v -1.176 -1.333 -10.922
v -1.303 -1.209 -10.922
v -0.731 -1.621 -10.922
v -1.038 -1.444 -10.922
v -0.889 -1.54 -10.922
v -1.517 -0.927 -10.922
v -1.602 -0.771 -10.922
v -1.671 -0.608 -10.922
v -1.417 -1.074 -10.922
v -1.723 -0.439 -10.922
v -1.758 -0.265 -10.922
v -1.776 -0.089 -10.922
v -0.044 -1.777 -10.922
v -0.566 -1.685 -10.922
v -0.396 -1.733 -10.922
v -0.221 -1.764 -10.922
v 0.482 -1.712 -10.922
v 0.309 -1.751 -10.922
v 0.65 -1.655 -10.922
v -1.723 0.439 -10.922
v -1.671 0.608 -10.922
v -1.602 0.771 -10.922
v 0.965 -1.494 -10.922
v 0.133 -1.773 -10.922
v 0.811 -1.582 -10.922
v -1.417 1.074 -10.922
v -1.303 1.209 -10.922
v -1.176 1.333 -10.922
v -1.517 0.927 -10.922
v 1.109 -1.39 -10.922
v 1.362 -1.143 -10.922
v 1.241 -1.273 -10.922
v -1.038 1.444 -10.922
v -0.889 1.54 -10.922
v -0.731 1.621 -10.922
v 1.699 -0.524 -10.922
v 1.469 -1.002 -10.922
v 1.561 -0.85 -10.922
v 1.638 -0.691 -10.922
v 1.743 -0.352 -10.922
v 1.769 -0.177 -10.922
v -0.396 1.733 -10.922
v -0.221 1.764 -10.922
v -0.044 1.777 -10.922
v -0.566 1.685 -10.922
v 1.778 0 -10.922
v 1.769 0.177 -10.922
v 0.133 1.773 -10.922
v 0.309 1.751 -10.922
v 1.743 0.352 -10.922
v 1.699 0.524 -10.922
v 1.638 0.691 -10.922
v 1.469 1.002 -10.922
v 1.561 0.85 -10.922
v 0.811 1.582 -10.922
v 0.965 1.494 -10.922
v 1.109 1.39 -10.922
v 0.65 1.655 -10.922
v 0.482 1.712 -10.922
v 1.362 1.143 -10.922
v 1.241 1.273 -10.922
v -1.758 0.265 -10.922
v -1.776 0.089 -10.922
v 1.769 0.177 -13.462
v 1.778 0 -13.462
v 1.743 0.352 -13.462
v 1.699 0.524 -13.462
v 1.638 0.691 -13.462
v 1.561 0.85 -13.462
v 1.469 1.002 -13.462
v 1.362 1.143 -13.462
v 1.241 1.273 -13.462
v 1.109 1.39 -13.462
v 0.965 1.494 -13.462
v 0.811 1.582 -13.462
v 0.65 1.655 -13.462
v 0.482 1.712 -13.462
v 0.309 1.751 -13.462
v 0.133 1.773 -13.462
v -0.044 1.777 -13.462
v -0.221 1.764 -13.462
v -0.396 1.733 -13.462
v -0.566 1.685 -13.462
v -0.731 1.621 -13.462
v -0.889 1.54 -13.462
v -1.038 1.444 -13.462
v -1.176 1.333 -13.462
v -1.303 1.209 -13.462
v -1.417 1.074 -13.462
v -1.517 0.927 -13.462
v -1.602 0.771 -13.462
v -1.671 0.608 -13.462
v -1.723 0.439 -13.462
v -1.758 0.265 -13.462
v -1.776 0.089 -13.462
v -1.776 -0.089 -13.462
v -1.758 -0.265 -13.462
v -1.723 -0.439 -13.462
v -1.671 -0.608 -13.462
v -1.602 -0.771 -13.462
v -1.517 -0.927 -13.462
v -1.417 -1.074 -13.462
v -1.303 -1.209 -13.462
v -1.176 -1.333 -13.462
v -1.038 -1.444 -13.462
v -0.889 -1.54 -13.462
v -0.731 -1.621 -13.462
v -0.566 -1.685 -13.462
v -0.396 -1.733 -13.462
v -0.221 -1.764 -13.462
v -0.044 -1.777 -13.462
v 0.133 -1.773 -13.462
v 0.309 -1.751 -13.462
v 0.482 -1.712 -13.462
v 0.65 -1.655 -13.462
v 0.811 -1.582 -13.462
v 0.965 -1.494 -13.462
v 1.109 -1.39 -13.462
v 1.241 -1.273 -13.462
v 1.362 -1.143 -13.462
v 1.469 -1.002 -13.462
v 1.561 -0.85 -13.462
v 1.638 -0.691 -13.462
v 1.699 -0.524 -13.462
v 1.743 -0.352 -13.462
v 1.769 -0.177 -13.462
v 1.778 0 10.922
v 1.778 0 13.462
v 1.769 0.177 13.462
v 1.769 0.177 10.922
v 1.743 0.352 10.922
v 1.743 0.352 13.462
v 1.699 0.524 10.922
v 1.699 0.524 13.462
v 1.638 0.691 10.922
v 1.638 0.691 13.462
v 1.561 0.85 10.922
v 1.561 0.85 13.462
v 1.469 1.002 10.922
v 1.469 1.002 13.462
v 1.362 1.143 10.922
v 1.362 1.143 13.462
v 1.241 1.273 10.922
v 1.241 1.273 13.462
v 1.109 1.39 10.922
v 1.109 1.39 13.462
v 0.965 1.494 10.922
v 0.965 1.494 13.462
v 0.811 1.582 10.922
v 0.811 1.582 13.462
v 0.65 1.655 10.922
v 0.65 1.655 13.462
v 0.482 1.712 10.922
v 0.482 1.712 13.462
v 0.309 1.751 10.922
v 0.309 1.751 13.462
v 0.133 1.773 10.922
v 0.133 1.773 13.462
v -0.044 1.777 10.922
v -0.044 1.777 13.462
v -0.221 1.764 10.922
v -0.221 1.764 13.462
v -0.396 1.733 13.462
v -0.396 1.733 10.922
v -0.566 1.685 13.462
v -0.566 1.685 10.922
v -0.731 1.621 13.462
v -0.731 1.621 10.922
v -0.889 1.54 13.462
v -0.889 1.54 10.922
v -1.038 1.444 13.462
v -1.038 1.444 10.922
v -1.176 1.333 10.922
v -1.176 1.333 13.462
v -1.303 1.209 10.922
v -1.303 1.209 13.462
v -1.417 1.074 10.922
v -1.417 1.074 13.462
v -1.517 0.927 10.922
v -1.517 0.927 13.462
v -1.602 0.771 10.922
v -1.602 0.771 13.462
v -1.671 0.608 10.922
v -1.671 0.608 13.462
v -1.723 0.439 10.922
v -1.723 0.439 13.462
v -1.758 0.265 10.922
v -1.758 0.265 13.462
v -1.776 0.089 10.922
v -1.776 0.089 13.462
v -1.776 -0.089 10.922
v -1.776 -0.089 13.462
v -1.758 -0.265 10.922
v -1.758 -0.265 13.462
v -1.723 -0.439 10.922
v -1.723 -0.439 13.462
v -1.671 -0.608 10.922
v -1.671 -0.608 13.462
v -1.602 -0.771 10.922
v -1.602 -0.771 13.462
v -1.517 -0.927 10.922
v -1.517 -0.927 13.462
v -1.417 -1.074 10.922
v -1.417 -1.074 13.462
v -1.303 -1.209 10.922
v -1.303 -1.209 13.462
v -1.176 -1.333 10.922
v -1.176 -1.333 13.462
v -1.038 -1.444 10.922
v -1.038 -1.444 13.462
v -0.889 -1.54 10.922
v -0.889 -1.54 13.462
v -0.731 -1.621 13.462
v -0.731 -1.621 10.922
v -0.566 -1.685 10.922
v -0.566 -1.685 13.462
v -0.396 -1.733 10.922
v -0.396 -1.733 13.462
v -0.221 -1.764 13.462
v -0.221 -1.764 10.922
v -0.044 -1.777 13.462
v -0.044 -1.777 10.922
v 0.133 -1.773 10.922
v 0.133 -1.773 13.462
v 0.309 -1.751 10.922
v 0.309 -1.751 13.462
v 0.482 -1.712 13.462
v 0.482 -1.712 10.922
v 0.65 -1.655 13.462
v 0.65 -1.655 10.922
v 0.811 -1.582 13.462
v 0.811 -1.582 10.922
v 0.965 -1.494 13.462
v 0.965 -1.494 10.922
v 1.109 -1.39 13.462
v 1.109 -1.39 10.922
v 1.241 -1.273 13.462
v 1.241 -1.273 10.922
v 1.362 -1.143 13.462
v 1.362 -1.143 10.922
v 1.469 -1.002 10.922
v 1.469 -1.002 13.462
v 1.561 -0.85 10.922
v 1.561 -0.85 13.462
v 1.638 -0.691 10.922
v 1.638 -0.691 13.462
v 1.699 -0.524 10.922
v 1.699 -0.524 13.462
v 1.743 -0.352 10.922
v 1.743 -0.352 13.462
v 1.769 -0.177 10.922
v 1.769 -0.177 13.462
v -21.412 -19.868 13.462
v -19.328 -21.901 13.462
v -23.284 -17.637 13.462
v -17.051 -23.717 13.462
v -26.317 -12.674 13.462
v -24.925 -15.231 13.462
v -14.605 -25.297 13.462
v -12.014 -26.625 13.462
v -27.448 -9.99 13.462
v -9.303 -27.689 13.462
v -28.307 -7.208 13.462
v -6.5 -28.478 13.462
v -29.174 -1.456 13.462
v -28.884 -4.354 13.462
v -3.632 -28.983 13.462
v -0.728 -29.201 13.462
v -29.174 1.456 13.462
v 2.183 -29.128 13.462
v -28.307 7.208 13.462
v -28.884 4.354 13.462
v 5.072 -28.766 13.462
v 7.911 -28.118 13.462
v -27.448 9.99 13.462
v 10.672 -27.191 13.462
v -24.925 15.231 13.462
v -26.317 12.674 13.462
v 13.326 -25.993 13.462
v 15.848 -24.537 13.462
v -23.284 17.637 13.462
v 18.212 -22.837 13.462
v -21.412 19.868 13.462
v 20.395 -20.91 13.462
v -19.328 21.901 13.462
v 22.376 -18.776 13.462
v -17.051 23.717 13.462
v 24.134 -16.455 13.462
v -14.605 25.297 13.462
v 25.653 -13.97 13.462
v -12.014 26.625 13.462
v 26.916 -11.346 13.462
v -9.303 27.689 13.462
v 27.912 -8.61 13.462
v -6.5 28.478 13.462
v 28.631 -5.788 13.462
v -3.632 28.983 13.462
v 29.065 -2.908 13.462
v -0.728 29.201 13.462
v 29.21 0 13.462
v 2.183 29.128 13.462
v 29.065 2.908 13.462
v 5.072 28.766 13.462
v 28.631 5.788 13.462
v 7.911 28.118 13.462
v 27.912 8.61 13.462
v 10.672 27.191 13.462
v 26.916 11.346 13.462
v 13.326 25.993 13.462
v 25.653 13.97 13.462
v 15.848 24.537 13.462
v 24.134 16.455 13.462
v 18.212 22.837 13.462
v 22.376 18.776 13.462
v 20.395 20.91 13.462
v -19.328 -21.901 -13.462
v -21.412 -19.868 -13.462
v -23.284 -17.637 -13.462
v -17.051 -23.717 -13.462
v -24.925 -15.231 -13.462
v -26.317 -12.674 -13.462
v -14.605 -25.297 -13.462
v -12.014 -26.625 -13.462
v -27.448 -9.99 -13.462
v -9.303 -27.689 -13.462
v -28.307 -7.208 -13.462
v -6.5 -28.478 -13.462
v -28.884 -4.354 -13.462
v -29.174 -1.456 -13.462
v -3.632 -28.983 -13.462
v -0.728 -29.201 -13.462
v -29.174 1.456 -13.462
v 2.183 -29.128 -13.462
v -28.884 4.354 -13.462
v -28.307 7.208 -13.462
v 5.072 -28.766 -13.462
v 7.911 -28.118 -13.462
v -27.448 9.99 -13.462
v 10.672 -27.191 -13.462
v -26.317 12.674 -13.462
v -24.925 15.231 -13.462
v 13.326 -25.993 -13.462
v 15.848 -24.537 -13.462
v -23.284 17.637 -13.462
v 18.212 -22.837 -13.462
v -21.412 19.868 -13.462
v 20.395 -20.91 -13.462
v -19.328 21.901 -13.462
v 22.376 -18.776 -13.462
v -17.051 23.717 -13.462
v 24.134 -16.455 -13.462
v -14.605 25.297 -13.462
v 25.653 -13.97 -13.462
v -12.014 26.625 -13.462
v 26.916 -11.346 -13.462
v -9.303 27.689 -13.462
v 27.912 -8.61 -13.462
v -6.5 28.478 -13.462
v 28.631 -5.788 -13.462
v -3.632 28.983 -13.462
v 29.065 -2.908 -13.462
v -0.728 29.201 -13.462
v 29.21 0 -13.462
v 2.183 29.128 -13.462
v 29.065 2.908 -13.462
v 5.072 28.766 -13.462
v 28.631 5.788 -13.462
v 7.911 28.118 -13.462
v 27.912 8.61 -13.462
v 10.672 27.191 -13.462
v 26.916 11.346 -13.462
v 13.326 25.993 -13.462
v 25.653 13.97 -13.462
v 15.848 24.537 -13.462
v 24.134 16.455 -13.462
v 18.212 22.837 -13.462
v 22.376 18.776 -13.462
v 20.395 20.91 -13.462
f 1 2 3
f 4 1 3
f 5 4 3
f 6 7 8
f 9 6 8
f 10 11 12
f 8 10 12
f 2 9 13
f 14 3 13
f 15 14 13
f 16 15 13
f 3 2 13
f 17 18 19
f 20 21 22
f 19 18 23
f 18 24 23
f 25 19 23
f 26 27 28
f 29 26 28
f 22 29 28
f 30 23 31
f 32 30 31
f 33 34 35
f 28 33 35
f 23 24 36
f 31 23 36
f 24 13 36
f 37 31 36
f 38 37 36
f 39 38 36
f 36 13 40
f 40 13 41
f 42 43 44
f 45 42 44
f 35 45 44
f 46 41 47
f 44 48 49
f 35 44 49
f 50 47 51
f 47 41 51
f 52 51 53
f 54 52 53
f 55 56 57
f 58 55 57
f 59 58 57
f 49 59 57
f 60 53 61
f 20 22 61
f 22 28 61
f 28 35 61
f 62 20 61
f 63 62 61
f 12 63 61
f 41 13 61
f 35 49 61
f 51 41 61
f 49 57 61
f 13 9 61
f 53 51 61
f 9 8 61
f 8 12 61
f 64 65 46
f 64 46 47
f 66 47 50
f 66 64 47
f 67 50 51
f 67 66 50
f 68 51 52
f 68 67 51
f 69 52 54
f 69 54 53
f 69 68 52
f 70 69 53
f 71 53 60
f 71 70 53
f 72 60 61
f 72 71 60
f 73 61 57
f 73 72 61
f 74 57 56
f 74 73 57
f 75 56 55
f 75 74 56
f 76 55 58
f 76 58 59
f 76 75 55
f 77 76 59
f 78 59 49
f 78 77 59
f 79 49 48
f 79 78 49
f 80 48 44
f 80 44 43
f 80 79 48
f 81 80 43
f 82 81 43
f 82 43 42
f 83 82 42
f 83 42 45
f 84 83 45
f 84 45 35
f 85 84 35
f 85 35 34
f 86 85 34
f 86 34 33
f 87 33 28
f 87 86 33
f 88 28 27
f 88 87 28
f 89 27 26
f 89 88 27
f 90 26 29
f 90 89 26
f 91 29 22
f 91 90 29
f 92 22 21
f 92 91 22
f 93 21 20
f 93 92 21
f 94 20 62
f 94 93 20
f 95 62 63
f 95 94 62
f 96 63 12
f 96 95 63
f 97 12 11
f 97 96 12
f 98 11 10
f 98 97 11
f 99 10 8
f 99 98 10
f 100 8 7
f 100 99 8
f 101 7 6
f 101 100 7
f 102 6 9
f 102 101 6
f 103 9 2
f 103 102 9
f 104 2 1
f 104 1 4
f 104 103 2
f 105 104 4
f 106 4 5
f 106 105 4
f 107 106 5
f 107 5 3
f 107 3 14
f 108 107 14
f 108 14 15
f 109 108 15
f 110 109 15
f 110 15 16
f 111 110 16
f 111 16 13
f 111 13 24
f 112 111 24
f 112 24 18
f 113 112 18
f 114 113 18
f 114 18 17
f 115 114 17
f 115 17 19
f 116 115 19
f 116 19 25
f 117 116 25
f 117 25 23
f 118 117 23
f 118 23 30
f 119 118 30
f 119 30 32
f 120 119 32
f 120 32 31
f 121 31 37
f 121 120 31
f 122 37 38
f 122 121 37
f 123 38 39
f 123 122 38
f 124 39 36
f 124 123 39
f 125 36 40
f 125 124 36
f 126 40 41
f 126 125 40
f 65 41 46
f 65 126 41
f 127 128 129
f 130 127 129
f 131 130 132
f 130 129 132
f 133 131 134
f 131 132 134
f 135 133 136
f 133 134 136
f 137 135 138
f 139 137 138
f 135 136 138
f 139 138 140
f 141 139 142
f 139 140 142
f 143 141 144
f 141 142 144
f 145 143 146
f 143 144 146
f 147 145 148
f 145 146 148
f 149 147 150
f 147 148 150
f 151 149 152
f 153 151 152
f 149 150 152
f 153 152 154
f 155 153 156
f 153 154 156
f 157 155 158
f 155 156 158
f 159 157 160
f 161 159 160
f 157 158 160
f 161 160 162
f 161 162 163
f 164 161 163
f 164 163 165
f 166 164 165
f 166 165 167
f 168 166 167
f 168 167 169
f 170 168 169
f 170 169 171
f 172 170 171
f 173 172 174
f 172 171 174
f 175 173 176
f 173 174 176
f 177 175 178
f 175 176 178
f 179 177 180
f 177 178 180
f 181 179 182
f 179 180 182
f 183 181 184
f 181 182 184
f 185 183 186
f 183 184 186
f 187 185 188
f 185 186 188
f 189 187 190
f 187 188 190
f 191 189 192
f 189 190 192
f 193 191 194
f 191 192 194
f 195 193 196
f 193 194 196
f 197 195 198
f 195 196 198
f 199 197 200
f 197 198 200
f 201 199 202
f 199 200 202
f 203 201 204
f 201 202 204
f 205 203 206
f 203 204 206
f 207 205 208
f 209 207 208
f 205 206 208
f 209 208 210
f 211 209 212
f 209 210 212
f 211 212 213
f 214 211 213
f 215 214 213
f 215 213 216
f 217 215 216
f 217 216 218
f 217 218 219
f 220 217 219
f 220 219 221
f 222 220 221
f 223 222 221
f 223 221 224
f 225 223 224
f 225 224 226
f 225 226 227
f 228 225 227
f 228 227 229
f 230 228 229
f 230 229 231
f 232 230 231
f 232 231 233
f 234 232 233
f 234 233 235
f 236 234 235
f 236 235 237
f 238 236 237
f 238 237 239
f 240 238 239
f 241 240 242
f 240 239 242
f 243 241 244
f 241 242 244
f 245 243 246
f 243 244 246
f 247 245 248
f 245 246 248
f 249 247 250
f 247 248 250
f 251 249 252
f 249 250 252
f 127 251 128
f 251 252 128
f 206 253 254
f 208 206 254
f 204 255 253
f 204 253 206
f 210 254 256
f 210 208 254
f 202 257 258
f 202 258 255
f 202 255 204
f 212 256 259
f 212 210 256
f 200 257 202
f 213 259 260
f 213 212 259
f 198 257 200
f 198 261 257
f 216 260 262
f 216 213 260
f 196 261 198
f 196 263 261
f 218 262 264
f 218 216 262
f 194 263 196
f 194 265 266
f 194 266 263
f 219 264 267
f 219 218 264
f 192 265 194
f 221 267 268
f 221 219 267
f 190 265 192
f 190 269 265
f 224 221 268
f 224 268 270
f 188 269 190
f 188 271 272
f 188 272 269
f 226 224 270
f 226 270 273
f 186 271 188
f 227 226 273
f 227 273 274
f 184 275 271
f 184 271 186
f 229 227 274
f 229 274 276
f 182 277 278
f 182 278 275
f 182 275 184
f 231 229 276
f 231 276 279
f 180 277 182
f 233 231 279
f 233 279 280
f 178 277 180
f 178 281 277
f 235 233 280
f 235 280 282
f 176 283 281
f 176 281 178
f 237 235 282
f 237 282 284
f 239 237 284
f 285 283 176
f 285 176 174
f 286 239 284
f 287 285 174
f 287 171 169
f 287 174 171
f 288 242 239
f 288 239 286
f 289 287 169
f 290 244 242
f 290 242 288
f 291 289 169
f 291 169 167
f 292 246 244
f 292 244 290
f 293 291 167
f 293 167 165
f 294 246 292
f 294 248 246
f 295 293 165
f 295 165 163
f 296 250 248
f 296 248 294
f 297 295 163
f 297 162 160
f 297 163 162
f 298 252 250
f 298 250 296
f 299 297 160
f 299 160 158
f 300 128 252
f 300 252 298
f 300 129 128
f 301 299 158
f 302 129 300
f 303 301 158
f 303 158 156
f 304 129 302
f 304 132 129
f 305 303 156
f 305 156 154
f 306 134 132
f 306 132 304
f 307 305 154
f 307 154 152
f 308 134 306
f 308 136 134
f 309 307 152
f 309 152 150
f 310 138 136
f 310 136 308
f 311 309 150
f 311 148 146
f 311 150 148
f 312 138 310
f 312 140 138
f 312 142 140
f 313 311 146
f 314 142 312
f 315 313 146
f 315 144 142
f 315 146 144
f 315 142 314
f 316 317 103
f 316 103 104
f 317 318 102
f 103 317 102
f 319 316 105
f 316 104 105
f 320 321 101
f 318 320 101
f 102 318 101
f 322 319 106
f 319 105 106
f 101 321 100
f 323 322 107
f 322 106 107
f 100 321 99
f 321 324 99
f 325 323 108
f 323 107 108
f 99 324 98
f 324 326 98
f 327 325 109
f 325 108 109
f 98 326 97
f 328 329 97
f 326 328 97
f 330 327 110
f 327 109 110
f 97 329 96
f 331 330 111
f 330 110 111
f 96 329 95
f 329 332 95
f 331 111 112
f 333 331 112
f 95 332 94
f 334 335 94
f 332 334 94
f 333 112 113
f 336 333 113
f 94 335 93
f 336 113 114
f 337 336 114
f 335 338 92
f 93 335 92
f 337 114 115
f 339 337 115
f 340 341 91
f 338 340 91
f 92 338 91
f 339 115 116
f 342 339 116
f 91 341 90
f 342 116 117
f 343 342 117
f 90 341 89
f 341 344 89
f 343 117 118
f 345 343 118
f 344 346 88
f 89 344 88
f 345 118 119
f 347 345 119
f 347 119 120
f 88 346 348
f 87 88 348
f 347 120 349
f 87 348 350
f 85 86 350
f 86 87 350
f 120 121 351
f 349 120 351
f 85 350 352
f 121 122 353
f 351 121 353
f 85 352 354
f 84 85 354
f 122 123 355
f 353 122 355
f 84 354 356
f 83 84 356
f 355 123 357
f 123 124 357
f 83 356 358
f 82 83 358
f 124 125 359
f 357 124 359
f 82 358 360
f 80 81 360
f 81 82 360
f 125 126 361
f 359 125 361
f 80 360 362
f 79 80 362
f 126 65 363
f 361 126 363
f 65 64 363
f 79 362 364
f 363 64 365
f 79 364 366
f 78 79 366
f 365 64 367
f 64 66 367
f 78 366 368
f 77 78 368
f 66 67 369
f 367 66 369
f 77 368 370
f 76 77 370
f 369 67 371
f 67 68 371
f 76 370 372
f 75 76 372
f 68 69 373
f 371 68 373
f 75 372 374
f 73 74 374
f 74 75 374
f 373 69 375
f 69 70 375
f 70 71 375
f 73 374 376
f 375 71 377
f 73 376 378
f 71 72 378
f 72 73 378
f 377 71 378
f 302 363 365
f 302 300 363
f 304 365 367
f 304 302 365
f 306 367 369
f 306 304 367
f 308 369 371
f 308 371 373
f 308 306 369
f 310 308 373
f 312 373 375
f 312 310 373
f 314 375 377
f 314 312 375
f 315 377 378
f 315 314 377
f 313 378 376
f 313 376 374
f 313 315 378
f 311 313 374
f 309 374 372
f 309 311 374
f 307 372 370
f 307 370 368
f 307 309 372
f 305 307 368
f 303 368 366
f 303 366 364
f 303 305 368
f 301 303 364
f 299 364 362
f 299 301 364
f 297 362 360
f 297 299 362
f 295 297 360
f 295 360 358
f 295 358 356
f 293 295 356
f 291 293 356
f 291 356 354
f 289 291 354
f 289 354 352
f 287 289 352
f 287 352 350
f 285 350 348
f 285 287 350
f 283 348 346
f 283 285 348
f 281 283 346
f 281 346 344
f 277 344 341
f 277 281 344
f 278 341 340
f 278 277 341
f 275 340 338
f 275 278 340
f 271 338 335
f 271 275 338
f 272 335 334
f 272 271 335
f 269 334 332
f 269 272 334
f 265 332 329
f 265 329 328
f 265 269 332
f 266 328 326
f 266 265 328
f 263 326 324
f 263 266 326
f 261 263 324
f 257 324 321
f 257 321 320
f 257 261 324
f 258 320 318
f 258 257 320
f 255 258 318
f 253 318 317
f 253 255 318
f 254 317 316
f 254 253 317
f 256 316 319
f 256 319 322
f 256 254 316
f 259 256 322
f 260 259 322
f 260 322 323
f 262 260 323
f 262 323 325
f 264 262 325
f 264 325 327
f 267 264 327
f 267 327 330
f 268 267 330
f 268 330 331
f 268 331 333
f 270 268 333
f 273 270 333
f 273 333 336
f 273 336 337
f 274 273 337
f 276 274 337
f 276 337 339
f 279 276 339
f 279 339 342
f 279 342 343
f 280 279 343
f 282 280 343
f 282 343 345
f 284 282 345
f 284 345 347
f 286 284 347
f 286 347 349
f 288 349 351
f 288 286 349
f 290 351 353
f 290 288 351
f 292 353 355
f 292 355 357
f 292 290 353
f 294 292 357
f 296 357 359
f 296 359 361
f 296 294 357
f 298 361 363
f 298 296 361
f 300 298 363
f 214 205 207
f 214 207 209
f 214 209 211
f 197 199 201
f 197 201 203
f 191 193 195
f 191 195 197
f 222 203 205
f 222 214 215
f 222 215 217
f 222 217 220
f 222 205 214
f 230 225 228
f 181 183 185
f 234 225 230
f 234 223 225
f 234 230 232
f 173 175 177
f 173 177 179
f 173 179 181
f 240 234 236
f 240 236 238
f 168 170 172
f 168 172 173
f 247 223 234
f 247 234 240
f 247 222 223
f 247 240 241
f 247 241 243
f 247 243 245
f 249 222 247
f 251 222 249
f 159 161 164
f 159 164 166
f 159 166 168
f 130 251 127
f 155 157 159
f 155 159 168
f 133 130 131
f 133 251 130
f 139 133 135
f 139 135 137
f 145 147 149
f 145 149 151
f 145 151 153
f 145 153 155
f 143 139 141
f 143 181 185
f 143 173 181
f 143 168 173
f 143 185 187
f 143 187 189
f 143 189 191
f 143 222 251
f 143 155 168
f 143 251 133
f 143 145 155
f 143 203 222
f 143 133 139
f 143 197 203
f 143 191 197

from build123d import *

# Parameters (mm, degrees)
F0_R     = 29.21
F1_DEPTH = 13.462
F2_R     = 1.778
F3_DEPTH = 2.54


# Not quite as in the source:
# - a pattern or mirror of a feature is missing from the dataset's text; its kind, count and spacing are read off the source's solid


with BuildPart() as f1:
    # F0 (on Top) → F1 (new body, symmetric)
    with BuildSketch(Plane.XY):
        Circle(F0_R)
    extrude(amount=F1_DEPTH, both=True)

    # F2 (on face) → F3 (cut)
    with BuildSketch(Plane.XY.offset(13.462)):
        Circle(F2_R)
    f3 = extrude(amount=-F3_DEPTH, mode=Mode.SUBTRACT)

    # F3_copies: F3 across plane
    add(f3.mirror(Plane(origin=(0, 0, 0), x_dir=(-1, 0, 0), z_dir=(0, 0, -1))), mode=Mode.SUBTRACT)


solid = f1.part
